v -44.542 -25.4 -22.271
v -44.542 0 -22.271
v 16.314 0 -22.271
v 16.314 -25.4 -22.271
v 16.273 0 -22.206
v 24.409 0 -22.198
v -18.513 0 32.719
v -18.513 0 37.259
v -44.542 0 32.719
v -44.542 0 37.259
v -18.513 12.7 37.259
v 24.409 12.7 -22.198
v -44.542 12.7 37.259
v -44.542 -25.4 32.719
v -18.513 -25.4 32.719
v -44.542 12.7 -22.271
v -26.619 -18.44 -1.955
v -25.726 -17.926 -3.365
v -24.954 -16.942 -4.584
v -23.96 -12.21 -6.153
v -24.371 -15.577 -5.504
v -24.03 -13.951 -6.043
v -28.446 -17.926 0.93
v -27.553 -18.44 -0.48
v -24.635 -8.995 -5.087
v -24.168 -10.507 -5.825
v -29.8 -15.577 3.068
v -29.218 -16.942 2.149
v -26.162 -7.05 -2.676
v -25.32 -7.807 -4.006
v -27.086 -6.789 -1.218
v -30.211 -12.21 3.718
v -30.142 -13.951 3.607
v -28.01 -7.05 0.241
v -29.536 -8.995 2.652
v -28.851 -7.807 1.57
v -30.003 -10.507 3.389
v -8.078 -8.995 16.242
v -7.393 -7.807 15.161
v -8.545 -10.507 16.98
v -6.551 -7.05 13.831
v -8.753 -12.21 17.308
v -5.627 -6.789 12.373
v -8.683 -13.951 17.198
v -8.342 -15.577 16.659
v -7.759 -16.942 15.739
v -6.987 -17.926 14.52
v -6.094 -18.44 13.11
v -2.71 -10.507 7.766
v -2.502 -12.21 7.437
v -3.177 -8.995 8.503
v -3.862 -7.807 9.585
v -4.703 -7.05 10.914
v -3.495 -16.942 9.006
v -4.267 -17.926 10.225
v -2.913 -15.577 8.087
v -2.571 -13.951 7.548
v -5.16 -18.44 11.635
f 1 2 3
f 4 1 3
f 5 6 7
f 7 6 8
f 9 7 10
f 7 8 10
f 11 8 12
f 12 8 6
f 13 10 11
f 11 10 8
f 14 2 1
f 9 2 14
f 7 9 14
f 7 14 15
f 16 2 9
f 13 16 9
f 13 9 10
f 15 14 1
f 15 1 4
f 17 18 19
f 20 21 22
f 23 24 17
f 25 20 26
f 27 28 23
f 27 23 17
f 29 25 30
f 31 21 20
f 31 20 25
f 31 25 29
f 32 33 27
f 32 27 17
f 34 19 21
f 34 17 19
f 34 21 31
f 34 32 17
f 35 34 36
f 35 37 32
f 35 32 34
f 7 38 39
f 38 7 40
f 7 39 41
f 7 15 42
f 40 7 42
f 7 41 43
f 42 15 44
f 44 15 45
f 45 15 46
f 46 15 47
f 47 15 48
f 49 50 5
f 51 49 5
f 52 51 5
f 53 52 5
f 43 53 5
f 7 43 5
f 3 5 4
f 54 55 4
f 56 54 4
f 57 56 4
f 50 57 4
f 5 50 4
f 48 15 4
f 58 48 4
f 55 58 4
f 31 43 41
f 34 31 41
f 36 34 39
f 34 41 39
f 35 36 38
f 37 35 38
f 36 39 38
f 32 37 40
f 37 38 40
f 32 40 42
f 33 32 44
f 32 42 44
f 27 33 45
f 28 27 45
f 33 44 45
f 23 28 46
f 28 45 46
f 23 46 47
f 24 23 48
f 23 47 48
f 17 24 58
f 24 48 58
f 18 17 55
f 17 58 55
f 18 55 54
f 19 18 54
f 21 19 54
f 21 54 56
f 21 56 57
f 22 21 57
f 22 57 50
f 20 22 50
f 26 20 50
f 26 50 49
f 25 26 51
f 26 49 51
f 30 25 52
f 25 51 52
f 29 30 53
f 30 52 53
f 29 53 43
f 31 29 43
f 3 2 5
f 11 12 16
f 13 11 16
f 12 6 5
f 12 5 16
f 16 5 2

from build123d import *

# Parameters (mm, degrees)
F0_W     = 93.299177
F0_H     = 54.989692
F1_DEPTH = 25.4
F3_DEPTH = 25.4
F4_R     = 5.858144
F5_DEPTH = 25.4
F6_W     = 80.10165
F6_H     = 55.35629
F7_DEPTH = 25.4
F9_DEPTH = 12.7


with BuildPart() as f1:
    # F0 (on Front) → F1 (new body)
    with BuildSketch(Plane.XZ):
        with Locations((2.107938, 5.224021)):
            Rectangle(F0_W, F0_H)
    extrude(amount=F1_DEPTH)

    # F2 (on face) → F3 (cut)
    with BuildSketch(Plane.XZ.offset(25.4)):
        Polygon((55.539589, 35.285052), (-18.513195, 32.718867), (16.313609, -22.270825), (61.221853, -24.653712), align=None)
    extrude(amount=-F3_DEPTH, mode=Mode.SUBTRACT)

    # F4 (on face) → F5 (cut)
    with BuildSketch(Plane(origin=(1.57643, 0, 0.998406), x_dir=(0, 1, 0), z_dir=(0.844819, 0, 0.535052))):
        with Locations((-12.647629, 13.463562)):
            Circle(F4_R)
    extrude(amount=-F5_DEPTH, mode=Mode.SUBTRACT)

    # F6 (on Front) → F7 (cut)
    with BuildSketch(Plane.XZ):
        with Locations((-4.857423, 5.040722)):
            Rectangle(F6_W, F6_H)
    extrude(amount=-F7_DEPTH, mode=Mode.SUBTRACT)

    # F8 (on face) → F9 (join)
    with BuildSketch(Plane(origin=(0, 0, 0), x_dir=(-1, 0, 0), z_dir=(0, 1, 0))):
        Polygon((44.54165, 37.259281), (18.513195, 37.259281), (-24.408791, -22.19771), (44.54165, -22.270825), align=None)
    extrude(amount=F9_DEPTH)


solid = f1.part
